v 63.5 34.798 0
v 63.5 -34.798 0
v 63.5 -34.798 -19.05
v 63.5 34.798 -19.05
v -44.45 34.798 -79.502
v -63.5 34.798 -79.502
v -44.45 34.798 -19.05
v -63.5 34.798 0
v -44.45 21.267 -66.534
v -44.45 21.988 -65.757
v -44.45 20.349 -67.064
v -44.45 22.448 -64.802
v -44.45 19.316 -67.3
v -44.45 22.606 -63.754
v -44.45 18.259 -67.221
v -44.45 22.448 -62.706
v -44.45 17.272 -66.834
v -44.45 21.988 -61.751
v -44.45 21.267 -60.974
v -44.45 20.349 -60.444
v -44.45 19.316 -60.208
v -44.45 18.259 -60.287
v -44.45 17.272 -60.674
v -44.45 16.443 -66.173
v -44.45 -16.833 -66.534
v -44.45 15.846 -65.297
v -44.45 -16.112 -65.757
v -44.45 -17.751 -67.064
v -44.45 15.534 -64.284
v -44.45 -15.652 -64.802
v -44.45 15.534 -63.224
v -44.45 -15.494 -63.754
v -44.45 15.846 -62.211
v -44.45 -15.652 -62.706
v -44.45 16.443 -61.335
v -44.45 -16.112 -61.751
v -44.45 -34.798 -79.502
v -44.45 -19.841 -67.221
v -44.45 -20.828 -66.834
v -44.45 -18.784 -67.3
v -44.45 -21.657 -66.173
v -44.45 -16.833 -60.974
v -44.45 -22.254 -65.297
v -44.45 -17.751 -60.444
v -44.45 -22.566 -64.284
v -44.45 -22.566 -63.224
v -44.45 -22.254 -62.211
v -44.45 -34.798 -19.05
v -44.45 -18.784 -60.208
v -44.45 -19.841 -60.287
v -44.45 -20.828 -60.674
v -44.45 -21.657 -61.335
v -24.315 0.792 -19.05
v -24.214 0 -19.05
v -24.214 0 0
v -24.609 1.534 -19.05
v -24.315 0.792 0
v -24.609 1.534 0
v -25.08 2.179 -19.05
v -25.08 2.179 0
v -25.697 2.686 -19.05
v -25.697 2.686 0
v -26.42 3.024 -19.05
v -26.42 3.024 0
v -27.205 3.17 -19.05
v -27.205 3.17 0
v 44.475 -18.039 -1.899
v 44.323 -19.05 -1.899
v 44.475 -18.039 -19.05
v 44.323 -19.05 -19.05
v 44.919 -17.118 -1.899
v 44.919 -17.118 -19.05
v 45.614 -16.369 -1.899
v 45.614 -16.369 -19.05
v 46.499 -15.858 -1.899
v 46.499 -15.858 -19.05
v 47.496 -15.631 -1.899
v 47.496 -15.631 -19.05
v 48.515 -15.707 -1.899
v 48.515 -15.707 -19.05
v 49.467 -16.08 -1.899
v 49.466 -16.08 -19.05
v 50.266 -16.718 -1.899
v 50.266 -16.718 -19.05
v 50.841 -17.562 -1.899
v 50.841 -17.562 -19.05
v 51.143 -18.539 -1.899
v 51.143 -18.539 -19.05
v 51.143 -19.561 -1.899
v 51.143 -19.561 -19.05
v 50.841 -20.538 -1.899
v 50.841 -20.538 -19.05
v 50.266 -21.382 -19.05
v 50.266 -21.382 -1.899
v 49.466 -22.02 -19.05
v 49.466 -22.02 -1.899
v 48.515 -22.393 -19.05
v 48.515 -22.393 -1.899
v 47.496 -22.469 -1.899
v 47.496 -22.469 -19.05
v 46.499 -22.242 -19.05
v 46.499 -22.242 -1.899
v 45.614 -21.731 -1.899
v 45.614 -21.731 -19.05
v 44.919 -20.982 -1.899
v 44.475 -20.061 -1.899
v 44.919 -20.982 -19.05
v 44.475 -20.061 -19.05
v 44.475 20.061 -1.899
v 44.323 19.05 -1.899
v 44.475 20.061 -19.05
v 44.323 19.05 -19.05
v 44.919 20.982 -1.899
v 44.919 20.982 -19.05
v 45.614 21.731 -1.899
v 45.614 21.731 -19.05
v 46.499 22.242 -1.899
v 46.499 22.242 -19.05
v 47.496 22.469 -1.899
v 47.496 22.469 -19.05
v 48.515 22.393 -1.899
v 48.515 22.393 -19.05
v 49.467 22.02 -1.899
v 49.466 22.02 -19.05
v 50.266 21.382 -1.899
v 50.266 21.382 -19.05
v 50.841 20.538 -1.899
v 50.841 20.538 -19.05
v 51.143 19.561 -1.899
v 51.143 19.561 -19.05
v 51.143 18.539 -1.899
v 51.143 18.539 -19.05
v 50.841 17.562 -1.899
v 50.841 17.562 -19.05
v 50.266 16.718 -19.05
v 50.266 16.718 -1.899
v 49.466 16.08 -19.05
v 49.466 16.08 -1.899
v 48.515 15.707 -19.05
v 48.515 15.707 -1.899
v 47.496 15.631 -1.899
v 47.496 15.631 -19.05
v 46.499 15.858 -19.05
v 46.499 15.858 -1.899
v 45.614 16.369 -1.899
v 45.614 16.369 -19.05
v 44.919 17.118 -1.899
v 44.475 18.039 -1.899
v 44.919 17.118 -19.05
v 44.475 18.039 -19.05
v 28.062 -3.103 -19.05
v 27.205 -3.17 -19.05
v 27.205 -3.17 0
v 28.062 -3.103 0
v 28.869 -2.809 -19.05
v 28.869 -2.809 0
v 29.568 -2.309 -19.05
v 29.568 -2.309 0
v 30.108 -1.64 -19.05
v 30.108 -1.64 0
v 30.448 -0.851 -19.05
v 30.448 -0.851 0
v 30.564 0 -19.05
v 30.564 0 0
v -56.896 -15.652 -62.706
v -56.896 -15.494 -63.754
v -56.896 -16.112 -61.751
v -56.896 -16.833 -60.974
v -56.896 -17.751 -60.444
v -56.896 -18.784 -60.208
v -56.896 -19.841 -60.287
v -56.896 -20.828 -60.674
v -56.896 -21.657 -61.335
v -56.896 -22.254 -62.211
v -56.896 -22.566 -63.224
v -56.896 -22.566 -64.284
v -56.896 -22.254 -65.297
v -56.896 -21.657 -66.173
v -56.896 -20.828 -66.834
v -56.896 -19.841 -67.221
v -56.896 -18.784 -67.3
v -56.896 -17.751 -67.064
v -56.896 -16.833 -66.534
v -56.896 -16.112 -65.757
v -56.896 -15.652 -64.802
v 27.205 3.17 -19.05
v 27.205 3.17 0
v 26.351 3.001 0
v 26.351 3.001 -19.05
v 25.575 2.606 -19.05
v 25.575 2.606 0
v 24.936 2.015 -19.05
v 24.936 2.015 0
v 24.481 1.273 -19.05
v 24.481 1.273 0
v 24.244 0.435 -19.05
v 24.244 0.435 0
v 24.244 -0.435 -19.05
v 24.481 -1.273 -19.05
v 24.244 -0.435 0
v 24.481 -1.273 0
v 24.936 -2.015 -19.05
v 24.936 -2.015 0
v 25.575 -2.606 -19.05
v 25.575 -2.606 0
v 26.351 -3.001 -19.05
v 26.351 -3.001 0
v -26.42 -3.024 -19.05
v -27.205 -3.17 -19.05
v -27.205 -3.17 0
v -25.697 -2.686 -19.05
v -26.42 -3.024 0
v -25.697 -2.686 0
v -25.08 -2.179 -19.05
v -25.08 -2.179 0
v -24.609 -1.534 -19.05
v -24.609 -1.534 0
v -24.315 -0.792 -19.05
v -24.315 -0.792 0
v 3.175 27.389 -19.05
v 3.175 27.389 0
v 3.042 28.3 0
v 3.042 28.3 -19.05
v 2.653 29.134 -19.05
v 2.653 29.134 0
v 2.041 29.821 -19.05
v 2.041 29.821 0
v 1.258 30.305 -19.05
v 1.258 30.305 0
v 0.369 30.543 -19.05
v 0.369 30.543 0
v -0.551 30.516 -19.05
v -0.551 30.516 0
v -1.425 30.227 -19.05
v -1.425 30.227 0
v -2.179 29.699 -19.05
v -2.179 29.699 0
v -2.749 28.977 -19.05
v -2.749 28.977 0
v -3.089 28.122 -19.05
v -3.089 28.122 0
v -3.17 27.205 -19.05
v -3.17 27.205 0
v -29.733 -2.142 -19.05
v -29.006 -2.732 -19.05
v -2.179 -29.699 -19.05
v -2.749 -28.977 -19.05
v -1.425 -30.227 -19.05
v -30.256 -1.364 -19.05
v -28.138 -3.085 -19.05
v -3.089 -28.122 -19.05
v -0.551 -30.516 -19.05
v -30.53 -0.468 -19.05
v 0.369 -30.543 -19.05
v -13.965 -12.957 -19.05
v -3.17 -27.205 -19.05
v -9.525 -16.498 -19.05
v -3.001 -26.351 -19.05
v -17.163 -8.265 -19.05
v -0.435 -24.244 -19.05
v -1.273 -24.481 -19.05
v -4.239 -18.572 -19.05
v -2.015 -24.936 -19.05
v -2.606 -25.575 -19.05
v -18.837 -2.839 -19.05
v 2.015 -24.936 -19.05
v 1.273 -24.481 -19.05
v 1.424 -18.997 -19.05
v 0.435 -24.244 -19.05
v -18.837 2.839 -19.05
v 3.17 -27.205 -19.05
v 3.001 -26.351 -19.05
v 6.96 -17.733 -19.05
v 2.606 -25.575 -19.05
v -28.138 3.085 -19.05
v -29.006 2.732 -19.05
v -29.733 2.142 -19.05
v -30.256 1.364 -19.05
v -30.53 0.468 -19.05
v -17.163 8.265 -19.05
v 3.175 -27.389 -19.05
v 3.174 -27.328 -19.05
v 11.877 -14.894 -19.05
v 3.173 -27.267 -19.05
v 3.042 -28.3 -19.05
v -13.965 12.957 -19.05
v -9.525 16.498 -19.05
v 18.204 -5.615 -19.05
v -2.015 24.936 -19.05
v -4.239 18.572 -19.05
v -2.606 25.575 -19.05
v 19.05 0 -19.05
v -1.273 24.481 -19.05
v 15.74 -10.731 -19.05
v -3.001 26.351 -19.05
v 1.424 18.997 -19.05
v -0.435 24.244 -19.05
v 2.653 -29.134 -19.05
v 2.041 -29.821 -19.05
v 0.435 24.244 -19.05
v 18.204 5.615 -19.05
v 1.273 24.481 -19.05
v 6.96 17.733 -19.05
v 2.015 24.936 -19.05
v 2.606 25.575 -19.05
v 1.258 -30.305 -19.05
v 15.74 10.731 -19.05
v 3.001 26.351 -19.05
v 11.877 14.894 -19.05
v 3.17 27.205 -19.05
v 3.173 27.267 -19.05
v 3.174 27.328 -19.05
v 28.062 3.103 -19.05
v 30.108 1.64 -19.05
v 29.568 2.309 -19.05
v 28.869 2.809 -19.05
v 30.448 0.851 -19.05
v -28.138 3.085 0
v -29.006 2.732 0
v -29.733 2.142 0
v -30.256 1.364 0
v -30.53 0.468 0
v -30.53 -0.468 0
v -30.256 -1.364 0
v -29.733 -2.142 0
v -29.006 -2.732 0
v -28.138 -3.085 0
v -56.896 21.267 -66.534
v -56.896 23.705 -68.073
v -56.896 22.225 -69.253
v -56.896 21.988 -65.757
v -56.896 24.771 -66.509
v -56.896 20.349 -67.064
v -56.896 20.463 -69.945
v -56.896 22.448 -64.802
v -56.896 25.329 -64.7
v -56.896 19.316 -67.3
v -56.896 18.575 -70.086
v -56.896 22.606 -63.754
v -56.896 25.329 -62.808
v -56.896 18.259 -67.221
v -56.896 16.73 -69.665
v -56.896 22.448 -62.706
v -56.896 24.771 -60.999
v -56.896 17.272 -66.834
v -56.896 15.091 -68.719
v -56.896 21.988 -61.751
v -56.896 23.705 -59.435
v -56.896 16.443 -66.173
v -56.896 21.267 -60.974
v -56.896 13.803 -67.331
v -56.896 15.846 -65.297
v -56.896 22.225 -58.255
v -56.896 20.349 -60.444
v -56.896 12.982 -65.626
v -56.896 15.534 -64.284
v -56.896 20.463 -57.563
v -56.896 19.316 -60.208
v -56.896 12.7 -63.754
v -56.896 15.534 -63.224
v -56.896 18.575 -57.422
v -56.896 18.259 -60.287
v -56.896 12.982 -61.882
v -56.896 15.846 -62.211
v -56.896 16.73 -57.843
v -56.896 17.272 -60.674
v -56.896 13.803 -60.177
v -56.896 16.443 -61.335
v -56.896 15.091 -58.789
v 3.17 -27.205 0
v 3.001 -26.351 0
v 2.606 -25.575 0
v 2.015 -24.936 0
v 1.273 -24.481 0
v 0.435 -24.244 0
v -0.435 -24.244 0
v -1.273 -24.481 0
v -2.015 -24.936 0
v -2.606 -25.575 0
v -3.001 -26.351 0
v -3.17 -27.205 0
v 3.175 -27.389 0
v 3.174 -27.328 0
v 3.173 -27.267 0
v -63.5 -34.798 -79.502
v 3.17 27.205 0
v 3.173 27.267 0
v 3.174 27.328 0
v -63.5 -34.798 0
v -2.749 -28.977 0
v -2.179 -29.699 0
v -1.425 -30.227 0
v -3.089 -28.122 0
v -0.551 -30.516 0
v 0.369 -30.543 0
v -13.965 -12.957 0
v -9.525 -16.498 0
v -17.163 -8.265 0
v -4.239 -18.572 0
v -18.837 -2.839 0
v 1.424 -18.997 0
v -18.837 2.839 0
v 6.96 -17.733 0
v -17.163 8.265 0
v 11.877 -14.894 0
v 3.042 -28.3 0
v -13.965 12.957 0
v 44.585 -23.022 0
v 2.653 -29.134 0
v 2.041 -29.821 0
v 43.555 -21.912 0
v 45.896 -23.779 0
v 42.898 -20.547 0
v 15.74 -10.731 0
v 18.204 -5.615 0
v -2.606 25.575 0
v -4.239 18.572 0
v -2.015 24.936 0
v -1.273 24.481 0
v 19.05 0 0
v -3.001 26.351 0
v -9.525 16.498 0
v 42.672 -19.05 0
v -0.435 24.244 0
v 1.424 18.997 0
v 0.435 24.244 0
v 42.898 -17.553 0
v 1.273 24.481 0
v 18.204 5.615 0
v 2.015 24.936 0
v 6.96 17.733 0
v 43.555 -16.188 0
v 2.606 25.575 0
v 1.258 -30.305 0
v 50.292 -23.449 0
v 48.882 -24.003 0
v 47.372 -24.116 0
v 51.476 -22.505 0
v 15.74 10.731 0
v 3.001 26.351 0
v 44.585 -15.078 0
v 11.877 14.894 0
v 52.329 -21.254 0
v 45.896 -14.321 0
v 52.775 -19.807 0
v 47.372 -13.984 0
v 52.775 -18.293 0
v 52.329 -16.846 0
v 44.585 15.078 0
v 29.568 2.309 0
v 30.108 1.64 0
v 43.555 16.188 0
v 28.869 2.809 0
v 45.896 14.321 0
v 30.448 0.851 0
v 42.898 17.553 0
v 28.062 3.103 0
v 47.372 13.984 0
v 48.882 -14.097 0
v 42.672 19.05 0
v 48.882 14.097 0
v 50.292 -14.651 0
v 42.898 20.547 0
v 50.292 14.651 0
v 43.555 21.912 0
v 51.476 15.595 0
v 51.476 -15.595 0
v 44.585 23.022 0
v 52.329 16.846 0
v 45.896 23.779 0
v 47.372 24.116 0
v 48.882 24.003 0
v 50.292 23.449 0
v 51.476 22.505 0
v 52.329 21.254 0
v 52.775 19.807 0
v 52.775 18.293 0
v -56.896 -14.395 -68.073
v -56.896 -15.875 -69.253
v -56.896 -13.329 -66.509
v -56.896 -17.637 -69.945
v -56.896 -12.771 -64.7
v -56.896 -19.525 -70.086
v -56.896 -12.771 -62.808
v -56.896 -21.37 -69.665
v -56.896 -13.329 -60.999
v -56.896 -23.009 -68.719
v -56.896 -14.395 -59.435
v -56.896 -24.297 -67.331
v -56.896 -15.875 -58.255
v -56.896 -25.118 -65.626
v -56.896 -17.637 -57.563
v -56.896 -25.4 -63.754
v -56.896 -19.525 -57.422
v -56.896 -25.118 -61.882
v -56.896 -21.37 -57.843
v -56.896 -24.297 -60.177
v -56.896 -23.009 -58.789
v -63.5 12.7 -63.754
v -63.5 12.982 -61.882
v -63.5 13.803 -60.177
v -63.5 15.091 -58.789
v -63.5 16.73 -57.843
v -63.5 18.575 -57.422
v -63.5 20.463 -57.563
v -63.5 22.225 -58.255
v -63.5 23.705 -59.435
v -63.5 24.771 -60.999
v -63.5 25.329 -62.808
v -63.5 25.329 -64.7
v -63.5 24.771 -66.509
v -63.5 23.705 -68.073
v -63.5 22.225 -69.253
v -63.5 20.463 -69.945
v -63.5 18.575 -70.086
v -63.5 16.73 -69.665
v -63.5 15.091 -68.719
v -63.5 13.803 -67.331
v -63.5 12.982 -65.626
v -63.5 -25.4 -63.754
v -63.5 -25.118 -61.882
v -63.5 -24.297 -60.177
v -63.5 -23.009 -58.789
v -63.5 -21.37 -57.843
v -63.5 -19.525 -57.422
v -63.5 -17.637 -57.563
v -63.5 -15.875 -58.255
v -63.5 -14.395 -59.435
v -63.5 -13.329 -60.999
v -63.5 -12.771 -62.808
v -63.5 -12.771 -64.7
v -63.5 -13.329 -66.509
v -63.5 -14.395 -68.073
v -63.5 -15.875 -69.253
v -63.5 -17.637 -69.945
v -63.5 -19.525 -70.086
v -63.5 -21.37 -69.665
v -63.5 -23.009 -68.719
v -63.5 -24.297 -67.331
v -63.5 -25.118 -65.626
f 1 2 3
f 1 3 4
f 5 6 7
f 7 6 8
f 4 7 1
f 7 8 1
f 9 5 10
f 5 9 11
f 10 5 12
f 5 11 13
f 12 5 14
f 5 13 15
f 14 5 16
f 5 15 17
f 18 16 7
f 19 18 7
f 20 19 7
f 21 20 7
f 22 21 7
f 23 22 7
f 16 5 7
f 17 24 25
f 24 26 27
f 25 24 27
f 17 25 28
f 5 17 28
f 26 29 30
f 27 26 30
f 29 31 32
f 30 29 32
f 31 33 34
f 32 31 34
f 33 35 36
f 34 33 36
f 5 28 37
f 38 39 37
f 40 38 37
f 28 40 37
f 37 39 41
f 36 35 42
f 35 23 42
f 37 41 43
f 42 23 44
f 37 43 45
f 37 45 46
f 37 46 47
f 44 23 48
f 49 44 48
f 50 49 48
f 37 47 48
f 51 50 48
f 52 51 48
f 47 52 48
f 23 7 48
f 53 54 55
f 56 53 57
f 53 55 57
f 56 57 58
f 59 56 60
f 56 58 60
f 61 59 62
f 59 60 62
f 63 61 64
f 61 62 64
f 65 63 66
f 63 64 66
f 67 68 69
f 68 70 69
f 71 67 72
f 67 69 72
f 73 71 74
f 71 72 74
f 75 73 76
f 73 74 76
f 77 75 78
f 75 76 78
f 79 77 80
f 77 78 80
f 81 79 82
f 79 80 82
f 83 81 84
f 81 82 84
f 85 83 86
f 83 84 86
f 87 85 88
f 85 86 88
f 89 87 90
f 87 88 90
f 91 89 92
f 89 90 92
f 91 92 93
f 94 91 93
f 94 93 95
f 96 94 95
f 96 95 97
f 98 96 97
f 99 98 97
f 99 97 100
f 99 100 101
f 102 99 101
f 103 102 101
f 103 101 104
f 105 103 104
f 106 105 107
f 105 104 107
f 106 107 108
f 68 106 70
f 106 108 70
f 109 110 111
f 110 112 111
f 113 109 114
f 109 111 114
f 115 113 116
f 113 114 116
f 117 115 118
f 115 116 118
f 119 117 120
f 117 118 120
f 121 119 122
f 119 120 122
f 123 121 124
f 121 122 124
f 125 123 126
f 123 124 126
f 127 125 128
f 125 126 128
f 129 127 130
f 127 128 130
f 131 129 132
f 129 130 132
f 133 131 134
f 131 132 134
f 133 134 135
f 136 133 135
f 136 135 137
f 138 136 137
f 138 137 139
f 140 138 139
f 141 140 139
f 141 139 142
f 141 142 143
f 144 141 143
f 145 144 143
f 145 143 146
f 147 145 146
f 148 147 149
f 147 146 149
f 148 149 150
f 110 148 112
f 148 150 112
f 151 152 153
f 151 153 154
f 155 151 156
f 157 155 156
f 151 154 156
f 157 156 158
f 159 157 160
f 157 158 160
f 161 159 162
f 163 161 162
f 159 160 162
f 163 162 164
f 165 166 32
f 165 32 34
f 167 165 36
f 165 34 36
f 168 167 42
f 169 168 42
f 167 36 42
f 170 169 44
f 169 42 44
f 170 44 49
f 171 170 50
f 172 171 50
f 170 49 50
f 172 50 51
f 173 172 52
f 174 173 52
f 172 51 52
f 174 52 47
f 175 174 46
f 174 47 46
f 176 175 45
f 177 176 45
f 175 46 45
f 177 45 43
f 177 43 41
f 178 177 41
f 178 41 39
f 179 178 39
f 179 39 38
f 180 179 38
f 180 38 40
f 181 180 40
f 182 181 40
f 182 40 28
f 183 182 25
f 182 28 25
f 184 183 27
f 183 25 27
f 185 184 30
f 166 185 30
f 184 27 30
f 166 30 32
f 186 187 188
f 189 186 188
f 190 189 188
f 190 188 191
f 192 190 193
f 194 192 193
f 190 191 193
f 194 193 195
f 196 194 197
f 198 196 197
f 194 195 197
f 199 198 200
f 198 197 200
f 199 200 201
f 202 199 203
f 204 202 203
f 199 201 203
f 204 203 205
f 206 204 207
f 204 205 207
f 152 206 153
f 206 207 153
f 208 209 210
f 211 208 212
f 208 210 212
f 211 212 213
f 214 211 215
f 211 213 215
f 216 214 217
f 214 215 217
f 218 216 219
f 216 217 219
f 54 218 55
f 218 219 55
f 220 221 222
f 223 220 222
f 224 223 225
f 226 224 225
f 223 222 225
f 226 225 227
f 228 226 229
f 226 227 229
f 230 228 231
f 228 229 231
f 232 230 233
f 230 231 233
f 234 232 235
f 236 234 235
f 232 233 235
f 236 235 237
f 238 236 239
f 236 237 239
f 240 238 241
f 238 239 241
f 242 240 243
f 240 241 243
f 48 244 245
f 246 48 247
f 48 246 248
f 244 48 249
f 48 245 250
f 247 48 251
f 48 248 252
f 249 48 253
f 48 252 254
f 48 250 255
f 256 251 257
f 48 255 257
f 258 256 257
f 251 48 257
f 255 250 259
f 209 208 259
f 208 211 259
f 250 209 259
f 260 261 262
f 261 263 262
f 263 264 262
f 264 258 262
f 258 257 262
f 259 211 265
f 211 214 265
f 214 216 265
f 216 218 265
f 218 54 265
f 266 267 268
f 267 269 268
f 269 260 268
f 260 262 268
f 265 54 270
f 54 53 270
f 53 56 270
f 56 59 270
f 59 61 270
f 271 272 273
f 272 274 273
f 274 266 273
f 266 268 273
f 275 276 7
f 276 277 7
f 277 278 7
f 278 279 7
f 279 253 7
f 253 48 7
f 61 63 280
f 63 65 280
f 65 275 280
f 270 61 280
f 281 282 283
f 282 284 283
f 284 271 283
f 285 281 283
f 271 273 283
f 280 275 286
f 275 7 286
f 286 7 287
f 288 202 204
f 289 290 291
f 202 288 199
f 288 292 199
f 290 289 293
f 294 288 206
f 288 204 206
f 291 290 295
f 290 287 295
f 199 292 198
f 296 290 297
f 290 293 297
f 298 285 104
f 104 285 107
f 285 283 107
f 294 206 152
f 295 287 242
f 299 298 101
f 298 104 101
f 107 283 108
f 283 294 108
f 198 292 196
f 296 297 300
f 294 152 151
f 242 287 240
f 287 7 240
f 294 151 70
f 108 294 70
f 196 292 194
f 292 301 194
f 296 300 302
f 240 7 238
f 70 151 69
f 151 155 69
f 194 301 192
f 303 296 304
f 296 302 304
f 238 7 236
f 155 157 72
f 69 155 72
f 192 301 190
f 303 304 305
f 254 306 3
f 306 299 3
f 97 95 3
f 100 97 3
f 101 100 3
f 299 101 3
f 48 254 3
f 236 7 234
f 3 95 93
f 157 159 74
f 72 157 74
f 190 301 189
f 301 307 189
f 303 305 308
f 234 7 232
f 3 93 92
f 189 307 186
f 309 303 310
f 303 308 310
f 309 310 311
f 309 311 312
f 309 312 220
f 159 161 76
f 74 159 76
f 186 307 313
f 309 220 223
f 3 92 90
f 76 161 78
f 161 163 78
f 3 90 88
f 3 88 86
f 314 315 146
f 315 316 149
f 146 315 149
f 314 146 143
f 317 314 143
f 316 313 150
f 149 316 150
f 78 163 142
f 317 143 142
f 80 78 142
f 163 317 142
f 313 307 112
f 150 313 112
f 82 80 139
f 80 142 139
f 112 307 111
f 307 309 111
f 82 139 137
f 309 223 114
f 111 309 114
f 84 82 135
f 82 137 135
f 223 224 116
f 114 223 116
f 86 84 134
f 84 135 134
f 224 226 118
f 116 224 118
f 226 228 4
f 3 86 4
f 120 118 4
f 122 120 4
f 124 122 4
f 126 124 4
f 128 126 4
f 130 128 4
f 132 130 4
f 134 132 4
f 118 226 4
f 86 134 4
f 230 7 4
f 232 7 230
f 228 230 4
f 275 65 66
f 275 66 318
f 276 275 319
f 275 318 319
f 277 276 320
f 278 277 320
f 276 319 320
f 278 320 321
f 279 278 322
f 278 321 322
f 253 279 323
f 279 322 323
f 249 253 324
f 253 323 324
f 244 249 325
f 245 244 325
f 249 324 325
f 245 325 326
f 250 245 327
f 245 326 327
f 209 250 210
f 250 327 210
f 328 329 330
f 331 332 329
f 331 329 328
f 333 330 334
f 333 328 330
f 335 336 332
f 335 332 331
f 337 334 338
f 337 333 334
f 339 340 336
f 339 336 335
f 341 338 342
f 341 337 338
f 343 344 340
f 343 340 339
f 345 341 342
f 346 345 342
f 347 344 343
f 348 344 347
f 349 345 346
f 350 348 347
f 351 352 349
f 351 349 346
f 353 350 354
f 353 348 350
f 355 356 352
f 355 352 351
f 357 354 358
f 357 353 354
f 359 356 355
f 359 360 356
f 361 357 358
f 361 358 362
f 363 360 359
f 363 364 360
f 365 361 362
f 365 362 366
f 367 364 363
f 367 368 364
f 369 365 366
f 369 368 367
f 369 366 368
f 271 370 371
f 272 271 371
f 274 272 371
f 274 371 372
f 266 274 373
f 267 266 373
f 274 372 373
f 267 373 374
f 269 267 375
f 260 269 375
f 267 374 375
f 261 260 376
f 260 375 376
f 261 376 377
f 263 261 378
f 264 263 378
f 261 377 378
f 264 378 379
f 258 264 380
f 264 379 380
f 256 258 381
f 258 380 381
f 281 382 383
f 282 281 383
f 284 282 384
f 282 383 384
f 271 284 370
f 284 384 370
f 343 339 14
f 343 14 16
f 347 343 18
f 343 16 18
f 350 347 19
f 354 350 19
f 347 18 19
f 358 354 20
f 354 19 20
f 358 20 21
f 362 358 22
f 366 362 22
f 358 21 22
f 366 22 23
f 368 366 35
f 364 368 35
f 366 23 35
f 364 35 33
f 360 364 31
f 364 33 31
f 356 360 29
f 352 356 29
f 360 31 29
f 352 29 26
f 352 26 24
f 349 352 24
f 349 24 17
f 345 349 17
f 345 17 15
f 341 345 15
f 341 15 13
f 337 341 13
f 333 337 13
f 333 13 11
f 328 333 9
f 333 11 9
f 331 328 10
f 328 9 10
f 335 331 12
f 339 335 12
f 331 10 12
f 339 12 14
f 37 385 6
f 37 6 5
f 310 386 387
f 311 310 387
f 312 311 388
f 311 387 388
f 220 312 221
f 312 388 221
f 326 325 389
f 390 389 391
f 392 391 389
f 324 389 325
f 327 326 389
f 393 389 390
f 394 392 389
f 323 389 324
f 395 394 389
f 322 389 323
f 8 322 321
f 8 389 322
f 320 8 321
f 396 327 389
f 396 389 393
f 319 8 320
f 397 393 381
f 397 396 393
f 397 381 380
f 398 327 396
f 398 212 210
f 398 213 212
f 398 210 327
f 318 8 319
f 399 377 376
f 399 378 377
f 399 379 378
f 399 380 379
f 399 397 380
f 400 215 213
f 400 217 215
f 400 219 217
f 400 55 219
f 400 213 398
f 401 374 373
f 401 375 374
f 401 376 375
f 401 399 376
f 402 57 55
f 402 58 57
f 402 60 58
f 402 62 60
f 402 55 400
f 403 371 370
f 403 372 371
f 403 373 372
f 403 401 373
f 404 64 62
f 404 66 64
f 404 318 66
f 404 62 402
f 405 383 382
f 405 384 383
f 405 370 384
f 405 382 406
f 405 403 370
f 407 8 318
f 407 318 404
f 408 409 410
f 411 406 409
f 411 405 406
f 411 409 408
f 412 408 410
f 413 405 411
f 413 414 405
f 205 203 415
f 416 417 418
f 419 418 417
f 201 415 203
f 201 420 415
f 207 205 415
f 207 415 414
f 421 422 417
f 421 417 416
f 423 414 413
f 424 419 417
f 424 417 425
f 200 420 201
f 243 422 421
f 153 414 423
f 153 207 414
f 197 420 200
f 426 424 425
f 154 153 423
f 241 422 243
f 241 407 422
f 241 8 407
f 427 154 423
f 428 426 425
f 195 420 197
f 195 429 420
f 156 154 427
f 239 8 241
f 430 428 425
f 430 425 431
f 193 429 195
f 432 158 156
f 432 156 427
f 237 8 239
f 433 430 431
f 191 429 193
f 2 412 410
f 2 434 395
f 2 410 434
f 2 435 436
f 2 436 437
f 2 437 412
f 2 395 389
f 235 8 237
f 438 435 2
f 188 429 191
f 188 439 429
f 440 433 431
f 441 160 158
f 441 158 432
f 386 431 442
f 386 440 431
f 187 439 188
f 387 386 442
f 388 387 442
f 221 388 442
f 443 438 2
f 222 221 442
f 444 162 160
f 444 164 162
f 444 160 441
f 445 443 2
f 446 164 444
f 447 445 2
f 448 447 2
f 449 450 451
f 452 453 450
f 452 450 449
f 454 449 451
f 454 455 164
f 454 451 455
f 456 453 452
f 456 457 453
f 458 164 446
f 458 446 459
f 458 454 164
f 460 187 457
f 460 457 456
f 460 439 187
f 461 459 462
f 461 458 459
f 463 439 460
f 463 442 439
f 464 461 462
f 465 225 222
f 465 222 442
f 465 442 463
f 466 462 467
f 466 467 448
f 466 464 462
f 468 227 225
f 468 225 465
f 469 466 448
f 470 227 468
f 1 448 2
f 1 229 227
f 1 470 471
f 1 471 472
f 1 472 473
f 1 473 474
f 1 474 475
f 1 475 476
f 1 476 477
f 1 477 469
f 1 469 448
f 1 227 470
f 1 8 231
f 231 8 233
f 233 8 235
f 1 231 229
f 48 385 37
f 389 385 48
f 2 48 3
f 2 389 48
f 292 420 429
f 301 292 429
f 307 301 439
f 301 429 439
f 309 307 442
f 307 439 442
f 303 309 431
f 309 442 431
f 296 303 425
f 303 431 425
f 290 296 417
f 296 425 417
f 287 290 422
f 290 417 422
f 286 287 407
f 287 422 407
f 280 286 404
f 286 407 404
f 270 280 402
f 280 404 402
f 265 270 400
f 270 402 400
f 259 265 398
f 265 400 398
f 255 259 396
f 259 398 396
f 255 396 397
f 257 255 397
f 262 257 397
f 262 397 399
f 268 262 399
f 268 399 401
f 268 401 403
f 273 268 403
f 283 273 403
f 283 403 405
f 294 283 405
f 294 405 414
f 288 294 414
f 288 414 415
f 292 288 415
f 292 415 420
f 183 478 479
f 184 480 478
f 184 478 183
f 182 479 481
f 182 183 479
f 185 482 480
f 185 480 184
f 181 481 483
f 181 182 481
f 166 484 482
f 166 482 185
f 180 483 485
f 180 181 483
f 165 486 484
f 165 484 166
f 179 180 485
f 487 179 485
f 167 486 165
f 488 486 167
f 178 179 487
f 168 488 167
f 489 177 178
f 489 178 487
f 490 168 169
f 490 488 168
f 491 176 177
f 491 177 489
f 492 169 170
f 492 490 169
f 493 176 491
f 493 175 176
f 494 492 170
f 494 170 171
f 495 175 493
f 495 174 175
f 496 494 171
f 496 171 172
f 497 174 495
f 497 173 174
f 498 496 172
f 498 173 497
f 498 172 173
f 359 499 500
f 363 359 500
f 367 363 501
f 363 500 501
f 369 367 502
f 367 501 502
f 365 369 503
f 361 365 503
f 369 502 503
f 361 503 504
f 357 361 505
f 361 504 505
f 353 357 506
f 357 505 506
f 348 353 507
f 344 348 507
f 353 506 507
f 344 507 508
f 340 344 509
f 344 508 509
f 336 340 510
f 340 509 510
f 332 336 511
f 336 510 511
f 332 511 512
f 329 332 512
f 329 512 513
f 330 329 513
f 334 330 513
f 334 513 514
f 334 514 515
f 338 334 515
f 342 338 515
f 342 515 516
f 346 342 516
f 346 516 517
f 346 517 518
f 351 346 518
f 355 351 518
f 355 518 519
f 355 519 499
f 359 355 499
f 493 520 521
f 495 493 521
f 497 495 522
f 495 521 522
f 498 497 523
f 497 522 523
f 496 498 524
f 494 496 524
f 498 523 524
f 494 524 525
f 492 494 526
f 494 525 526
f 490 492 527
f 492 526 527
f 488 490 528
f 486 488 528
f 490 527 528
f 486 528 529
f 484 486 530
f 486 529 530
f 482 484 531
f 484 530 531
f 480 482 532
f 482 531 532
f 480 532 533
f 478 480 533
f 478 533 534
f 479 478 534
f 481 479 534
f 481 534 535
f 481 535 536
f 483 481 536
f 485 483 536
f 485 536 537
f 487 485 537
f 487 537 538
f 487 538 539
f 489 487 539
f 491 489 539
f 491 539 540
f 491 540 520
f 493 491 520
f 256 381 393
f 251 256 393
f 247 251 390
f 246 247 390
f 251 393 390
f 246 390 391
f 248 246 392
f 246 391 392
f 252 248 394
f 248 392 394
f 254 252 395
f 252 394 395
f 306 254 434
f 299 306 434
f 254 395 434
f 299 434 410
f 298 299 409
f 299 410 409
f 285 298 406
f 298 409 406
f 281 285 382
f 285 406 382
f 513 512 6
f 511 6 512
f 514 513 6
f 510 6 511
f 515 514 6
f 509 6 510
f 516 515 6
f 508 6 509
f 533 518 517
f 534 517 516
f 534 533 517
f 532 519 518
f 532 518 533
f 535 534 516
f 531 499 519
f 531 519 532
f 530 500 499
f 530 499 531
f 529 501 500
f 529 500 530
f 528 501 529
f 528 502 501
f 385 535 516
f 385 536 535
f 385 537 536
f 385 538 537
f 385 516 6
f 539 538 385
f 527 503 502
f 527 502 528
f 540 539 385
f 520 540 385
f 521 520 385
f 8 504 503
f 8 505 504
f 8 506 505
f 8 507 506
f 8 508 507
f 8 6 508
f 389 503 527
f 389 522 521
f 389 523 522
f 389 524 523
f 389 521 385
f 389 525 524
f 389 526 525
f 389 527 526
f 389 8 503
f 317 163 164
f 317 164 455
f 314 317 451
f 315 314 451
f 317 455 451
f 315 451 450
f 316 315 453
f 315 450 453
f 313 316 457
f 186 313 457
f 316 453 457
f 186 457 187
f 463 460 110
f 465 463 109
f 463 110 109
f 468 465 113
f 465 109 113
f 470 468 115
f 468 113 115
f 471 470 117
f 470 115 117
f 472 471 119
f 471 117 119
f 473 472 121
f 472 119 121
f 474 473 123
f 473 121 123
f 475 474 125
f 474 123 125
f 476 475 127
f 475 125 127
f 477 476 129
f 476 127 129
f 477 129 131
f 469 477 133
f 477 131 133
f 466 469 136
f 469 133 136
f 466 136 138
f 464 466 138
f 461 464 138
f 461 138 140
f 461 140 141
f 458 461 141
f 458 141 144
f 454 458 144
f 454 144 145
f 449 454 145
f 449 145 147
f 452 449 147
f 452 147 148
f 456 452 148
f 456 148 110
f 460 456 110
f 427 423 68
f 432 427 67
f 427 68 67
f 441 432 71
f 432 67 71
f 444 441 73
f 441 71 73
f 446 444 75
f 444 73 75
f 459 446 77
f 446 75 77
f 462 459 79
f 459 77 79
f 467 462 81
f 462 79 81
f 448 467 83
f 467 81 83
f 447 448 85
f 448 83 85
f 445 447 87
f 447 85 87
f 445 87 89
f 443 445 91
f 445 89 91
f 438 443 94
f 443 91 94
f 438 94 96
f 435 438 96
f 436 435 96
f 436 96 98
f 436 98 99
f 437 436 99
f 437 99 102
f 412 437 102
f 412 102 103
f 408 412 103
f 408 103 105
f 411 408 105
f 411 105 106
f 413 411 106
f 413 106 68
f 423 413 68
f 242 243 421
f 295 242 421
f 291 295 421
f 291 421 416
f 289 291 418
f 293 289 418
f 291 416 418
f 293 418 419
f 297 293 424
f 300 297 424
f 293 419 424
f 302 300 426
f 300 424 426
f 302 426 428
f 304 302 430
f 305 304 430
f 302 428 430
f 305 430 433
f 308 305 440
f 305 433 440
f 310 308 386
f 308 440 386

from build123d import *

# Parameters (mm, degrees)
F0_W            = 127
F0_H            = 69.596
F1_DEPTH        = 19.05
F2_W            = 19.05
F2_H            = 69.596
F3_DEPTH        = 60.452
F4_R            = 19.05
F5_DEPTH        = 25.4
F7_DEPTH        = 25.4
F9_D            = 6.858
F9_DEPTH        = 25.4
F9_CSINK_D      = 10.16
F9_CSINK_ANGLE  = 82
F9_TIP          = 2.0603510626
F11_D           = 7.112
F11_DEPTH       = 25.4
F11_CBORE_D     = 12.7
F11_CBORE_DEPTH = 6.604
F11_TIP         = 2.1366603613


with BuildPart() as f1:
    # F0 (on Top) → F1 (new body)
    with BuildSketch(Plane.XY):
        Rectangle(F0_W, F0_H)
    extrude(amount=-F1_DEPTH)

    # F2 (on face) → F3 (join)
    with BuildSketch(Plane(origin=(0, 0, -19.05), x_dir=(1, 0, 0), z_dir=(0, 0, -1))):
        with Locations((-53.975, 0)):
            Rectangle(F2_W, F2_H)
    extrude(amount=F3_DEPTH)

    # F4 (on face) → F5 (cut)
    with BuildSketch(Plane.XY):
        Circle(F4_R)
    extrude(amount=-F5_DEPTH, mode=Mode.SUBTRACT)

    # F6 (on face) → F7 (cut)
    with BuildSketch(Plane.XY):
        with BuildLine():
            ThreePointArc((-3.1696624056, 27.2052425135), (0, 24.2142676058), (3.1696624056, 27.2052425135))
            ThreePointArc((3.1696624056, 27.2052425135), (0, 27.3892676058), (-3.1696624056, 27.2052425135))
        make_face()
        with BuildLine():
            ThreePointArc((-3.1696624056, 27.2052425135), (0, 27.3892676058), (3.1696624056, 27.2052425135))
            ThreePointArc((3.1696624056, 27.2052425135), (3.1736653209, 27.2972163639), (3.175, 27.3892676058))
            ThreePointArc((3.175, 27.3892676058), (-0.0920512419, 30.5629329266), (-3.1696624056, 27.2052425135))
        make_face()
        with BuildLine():
            ThreePointArc((27.2052425135, 3.1696624056), (27.3432226289, 1.5875), (27.3892676058, 0))
            ThreePointArc((27.3892676058, 0), (27.3432226289, -1.5875), (27.2052425135, -3.1696624056))
            ThreePointArc((27.2052425135, -3.1696624056), (29.568297818, -2.3092103269), (30.5642676058, 0))
            ThreePointArc((30.5642676058, 0), (29.568297818, 2.3092103269), (27.2052425135, 3.1696624056))
        make_face()
        with BuildLine():
            ThreePointArc((27.2052425135, -3.1696624056), (27.3432226289, -1.5875), (27.3892676058, 0))
            ThreePointArc((27.3892676058, 0), (27.3432226289, 1.5875), (27.2052425135, 3.1696624056))
            ThreePointArc((27.2052425135, 3.1696624056), (24.2142676058, 0), (27.2052425135, -3.1696624056))
        make_face()
        with BuildLine():
            ThreePointArc((3.175, -27.3892676058), (3.1736653209, -27.2972163639), (3.1696624056, -27.2052425135))
            ThreePointArc((3.1696624056, -27.2052425135), (0, -27.3892676058), (-3.1696624056, -27.2052425135))
            ThreePointArc((-3.1696624056, -27.2052425135), (-0.0920512419, -30.5629329266), (3.175, -27.3892676058))
        make_face()
        with BuildLine():
            ThreePointArc((-3.1696624056, -27.2052425135), (0, -27.3892676058), (3.1696624056, -27.2052425135))
            ThreePointArc((3.1696624056, -27.2052425135), (0, -24.2142676058), (-3.1696624056, -27.2052425135))
        make_face()
        with BuildLine():
            ThreePointArc((-24.2142676058, 0), (-25.0800572788, 2.1790302123), (-27.2052425135, 3.1696624056))
            ThreePointArc((-27.2052425135, 3.1696624056), (-27.3892676058, 0), (-27.2052425135, -3.1696624056))
            ThreePointArc((-27.2052425135, -3.1696624056), (-25.0800572788, -2.1790302123), (-24.2142676058, 0))
        make_face()
        with BuildLine():
            ThreePointArc((-27.2052425135, -3.1696624056), (-27.3892676058, 0), (-27.2052425135, 3.1696624056))
            ThreePointArc((-27.2052425135, 3.1696624056), (-30.5642676058, 0), (-27.2052425135, -3.1696624056))
        make_face()
    extrude(amount=-F7_DEPTH, mode=Mode.SUBTRACT)

    # F9
    with Locations(Plane.XY):
        with Locations((47.752, 19.05), (47.752, -19.05)):
            CounterSinkHole(F9_D / 2, F9_CSINK_D / 2, depth=F9_DEPTH, counter_sink_angle=F9_CSINK_ANGLE)
            with Locations((0, 0, -(F9_DEPTH + F9_TIP / 2))):  # 118° drill point
                Cone(0, F9_D / 2, F9_TIP, mode=Mode.SUBTRACT)

    # F11
    with Locations(Plane(origin=(-63.5, 0, 0), x_dir=(0, -1, 0), z_dir=(-1, 0, 0))):
        with Locations((-19.05, -63.754), (19.05, -63.754)):
            CounterBoreHole(F11_D / 2, F11_CBORE_D / 2, F11_CBORE_DEPTH, depth=F11_DEPTH)
            with Locations((0, 0, -(F11_DEPTH + F11_TIP / 2))):  # 118° drill point
                Cone(0, F11_D / 2, F11_TIP, mode=Mode.SUBTRACT)


solid = f1.part
